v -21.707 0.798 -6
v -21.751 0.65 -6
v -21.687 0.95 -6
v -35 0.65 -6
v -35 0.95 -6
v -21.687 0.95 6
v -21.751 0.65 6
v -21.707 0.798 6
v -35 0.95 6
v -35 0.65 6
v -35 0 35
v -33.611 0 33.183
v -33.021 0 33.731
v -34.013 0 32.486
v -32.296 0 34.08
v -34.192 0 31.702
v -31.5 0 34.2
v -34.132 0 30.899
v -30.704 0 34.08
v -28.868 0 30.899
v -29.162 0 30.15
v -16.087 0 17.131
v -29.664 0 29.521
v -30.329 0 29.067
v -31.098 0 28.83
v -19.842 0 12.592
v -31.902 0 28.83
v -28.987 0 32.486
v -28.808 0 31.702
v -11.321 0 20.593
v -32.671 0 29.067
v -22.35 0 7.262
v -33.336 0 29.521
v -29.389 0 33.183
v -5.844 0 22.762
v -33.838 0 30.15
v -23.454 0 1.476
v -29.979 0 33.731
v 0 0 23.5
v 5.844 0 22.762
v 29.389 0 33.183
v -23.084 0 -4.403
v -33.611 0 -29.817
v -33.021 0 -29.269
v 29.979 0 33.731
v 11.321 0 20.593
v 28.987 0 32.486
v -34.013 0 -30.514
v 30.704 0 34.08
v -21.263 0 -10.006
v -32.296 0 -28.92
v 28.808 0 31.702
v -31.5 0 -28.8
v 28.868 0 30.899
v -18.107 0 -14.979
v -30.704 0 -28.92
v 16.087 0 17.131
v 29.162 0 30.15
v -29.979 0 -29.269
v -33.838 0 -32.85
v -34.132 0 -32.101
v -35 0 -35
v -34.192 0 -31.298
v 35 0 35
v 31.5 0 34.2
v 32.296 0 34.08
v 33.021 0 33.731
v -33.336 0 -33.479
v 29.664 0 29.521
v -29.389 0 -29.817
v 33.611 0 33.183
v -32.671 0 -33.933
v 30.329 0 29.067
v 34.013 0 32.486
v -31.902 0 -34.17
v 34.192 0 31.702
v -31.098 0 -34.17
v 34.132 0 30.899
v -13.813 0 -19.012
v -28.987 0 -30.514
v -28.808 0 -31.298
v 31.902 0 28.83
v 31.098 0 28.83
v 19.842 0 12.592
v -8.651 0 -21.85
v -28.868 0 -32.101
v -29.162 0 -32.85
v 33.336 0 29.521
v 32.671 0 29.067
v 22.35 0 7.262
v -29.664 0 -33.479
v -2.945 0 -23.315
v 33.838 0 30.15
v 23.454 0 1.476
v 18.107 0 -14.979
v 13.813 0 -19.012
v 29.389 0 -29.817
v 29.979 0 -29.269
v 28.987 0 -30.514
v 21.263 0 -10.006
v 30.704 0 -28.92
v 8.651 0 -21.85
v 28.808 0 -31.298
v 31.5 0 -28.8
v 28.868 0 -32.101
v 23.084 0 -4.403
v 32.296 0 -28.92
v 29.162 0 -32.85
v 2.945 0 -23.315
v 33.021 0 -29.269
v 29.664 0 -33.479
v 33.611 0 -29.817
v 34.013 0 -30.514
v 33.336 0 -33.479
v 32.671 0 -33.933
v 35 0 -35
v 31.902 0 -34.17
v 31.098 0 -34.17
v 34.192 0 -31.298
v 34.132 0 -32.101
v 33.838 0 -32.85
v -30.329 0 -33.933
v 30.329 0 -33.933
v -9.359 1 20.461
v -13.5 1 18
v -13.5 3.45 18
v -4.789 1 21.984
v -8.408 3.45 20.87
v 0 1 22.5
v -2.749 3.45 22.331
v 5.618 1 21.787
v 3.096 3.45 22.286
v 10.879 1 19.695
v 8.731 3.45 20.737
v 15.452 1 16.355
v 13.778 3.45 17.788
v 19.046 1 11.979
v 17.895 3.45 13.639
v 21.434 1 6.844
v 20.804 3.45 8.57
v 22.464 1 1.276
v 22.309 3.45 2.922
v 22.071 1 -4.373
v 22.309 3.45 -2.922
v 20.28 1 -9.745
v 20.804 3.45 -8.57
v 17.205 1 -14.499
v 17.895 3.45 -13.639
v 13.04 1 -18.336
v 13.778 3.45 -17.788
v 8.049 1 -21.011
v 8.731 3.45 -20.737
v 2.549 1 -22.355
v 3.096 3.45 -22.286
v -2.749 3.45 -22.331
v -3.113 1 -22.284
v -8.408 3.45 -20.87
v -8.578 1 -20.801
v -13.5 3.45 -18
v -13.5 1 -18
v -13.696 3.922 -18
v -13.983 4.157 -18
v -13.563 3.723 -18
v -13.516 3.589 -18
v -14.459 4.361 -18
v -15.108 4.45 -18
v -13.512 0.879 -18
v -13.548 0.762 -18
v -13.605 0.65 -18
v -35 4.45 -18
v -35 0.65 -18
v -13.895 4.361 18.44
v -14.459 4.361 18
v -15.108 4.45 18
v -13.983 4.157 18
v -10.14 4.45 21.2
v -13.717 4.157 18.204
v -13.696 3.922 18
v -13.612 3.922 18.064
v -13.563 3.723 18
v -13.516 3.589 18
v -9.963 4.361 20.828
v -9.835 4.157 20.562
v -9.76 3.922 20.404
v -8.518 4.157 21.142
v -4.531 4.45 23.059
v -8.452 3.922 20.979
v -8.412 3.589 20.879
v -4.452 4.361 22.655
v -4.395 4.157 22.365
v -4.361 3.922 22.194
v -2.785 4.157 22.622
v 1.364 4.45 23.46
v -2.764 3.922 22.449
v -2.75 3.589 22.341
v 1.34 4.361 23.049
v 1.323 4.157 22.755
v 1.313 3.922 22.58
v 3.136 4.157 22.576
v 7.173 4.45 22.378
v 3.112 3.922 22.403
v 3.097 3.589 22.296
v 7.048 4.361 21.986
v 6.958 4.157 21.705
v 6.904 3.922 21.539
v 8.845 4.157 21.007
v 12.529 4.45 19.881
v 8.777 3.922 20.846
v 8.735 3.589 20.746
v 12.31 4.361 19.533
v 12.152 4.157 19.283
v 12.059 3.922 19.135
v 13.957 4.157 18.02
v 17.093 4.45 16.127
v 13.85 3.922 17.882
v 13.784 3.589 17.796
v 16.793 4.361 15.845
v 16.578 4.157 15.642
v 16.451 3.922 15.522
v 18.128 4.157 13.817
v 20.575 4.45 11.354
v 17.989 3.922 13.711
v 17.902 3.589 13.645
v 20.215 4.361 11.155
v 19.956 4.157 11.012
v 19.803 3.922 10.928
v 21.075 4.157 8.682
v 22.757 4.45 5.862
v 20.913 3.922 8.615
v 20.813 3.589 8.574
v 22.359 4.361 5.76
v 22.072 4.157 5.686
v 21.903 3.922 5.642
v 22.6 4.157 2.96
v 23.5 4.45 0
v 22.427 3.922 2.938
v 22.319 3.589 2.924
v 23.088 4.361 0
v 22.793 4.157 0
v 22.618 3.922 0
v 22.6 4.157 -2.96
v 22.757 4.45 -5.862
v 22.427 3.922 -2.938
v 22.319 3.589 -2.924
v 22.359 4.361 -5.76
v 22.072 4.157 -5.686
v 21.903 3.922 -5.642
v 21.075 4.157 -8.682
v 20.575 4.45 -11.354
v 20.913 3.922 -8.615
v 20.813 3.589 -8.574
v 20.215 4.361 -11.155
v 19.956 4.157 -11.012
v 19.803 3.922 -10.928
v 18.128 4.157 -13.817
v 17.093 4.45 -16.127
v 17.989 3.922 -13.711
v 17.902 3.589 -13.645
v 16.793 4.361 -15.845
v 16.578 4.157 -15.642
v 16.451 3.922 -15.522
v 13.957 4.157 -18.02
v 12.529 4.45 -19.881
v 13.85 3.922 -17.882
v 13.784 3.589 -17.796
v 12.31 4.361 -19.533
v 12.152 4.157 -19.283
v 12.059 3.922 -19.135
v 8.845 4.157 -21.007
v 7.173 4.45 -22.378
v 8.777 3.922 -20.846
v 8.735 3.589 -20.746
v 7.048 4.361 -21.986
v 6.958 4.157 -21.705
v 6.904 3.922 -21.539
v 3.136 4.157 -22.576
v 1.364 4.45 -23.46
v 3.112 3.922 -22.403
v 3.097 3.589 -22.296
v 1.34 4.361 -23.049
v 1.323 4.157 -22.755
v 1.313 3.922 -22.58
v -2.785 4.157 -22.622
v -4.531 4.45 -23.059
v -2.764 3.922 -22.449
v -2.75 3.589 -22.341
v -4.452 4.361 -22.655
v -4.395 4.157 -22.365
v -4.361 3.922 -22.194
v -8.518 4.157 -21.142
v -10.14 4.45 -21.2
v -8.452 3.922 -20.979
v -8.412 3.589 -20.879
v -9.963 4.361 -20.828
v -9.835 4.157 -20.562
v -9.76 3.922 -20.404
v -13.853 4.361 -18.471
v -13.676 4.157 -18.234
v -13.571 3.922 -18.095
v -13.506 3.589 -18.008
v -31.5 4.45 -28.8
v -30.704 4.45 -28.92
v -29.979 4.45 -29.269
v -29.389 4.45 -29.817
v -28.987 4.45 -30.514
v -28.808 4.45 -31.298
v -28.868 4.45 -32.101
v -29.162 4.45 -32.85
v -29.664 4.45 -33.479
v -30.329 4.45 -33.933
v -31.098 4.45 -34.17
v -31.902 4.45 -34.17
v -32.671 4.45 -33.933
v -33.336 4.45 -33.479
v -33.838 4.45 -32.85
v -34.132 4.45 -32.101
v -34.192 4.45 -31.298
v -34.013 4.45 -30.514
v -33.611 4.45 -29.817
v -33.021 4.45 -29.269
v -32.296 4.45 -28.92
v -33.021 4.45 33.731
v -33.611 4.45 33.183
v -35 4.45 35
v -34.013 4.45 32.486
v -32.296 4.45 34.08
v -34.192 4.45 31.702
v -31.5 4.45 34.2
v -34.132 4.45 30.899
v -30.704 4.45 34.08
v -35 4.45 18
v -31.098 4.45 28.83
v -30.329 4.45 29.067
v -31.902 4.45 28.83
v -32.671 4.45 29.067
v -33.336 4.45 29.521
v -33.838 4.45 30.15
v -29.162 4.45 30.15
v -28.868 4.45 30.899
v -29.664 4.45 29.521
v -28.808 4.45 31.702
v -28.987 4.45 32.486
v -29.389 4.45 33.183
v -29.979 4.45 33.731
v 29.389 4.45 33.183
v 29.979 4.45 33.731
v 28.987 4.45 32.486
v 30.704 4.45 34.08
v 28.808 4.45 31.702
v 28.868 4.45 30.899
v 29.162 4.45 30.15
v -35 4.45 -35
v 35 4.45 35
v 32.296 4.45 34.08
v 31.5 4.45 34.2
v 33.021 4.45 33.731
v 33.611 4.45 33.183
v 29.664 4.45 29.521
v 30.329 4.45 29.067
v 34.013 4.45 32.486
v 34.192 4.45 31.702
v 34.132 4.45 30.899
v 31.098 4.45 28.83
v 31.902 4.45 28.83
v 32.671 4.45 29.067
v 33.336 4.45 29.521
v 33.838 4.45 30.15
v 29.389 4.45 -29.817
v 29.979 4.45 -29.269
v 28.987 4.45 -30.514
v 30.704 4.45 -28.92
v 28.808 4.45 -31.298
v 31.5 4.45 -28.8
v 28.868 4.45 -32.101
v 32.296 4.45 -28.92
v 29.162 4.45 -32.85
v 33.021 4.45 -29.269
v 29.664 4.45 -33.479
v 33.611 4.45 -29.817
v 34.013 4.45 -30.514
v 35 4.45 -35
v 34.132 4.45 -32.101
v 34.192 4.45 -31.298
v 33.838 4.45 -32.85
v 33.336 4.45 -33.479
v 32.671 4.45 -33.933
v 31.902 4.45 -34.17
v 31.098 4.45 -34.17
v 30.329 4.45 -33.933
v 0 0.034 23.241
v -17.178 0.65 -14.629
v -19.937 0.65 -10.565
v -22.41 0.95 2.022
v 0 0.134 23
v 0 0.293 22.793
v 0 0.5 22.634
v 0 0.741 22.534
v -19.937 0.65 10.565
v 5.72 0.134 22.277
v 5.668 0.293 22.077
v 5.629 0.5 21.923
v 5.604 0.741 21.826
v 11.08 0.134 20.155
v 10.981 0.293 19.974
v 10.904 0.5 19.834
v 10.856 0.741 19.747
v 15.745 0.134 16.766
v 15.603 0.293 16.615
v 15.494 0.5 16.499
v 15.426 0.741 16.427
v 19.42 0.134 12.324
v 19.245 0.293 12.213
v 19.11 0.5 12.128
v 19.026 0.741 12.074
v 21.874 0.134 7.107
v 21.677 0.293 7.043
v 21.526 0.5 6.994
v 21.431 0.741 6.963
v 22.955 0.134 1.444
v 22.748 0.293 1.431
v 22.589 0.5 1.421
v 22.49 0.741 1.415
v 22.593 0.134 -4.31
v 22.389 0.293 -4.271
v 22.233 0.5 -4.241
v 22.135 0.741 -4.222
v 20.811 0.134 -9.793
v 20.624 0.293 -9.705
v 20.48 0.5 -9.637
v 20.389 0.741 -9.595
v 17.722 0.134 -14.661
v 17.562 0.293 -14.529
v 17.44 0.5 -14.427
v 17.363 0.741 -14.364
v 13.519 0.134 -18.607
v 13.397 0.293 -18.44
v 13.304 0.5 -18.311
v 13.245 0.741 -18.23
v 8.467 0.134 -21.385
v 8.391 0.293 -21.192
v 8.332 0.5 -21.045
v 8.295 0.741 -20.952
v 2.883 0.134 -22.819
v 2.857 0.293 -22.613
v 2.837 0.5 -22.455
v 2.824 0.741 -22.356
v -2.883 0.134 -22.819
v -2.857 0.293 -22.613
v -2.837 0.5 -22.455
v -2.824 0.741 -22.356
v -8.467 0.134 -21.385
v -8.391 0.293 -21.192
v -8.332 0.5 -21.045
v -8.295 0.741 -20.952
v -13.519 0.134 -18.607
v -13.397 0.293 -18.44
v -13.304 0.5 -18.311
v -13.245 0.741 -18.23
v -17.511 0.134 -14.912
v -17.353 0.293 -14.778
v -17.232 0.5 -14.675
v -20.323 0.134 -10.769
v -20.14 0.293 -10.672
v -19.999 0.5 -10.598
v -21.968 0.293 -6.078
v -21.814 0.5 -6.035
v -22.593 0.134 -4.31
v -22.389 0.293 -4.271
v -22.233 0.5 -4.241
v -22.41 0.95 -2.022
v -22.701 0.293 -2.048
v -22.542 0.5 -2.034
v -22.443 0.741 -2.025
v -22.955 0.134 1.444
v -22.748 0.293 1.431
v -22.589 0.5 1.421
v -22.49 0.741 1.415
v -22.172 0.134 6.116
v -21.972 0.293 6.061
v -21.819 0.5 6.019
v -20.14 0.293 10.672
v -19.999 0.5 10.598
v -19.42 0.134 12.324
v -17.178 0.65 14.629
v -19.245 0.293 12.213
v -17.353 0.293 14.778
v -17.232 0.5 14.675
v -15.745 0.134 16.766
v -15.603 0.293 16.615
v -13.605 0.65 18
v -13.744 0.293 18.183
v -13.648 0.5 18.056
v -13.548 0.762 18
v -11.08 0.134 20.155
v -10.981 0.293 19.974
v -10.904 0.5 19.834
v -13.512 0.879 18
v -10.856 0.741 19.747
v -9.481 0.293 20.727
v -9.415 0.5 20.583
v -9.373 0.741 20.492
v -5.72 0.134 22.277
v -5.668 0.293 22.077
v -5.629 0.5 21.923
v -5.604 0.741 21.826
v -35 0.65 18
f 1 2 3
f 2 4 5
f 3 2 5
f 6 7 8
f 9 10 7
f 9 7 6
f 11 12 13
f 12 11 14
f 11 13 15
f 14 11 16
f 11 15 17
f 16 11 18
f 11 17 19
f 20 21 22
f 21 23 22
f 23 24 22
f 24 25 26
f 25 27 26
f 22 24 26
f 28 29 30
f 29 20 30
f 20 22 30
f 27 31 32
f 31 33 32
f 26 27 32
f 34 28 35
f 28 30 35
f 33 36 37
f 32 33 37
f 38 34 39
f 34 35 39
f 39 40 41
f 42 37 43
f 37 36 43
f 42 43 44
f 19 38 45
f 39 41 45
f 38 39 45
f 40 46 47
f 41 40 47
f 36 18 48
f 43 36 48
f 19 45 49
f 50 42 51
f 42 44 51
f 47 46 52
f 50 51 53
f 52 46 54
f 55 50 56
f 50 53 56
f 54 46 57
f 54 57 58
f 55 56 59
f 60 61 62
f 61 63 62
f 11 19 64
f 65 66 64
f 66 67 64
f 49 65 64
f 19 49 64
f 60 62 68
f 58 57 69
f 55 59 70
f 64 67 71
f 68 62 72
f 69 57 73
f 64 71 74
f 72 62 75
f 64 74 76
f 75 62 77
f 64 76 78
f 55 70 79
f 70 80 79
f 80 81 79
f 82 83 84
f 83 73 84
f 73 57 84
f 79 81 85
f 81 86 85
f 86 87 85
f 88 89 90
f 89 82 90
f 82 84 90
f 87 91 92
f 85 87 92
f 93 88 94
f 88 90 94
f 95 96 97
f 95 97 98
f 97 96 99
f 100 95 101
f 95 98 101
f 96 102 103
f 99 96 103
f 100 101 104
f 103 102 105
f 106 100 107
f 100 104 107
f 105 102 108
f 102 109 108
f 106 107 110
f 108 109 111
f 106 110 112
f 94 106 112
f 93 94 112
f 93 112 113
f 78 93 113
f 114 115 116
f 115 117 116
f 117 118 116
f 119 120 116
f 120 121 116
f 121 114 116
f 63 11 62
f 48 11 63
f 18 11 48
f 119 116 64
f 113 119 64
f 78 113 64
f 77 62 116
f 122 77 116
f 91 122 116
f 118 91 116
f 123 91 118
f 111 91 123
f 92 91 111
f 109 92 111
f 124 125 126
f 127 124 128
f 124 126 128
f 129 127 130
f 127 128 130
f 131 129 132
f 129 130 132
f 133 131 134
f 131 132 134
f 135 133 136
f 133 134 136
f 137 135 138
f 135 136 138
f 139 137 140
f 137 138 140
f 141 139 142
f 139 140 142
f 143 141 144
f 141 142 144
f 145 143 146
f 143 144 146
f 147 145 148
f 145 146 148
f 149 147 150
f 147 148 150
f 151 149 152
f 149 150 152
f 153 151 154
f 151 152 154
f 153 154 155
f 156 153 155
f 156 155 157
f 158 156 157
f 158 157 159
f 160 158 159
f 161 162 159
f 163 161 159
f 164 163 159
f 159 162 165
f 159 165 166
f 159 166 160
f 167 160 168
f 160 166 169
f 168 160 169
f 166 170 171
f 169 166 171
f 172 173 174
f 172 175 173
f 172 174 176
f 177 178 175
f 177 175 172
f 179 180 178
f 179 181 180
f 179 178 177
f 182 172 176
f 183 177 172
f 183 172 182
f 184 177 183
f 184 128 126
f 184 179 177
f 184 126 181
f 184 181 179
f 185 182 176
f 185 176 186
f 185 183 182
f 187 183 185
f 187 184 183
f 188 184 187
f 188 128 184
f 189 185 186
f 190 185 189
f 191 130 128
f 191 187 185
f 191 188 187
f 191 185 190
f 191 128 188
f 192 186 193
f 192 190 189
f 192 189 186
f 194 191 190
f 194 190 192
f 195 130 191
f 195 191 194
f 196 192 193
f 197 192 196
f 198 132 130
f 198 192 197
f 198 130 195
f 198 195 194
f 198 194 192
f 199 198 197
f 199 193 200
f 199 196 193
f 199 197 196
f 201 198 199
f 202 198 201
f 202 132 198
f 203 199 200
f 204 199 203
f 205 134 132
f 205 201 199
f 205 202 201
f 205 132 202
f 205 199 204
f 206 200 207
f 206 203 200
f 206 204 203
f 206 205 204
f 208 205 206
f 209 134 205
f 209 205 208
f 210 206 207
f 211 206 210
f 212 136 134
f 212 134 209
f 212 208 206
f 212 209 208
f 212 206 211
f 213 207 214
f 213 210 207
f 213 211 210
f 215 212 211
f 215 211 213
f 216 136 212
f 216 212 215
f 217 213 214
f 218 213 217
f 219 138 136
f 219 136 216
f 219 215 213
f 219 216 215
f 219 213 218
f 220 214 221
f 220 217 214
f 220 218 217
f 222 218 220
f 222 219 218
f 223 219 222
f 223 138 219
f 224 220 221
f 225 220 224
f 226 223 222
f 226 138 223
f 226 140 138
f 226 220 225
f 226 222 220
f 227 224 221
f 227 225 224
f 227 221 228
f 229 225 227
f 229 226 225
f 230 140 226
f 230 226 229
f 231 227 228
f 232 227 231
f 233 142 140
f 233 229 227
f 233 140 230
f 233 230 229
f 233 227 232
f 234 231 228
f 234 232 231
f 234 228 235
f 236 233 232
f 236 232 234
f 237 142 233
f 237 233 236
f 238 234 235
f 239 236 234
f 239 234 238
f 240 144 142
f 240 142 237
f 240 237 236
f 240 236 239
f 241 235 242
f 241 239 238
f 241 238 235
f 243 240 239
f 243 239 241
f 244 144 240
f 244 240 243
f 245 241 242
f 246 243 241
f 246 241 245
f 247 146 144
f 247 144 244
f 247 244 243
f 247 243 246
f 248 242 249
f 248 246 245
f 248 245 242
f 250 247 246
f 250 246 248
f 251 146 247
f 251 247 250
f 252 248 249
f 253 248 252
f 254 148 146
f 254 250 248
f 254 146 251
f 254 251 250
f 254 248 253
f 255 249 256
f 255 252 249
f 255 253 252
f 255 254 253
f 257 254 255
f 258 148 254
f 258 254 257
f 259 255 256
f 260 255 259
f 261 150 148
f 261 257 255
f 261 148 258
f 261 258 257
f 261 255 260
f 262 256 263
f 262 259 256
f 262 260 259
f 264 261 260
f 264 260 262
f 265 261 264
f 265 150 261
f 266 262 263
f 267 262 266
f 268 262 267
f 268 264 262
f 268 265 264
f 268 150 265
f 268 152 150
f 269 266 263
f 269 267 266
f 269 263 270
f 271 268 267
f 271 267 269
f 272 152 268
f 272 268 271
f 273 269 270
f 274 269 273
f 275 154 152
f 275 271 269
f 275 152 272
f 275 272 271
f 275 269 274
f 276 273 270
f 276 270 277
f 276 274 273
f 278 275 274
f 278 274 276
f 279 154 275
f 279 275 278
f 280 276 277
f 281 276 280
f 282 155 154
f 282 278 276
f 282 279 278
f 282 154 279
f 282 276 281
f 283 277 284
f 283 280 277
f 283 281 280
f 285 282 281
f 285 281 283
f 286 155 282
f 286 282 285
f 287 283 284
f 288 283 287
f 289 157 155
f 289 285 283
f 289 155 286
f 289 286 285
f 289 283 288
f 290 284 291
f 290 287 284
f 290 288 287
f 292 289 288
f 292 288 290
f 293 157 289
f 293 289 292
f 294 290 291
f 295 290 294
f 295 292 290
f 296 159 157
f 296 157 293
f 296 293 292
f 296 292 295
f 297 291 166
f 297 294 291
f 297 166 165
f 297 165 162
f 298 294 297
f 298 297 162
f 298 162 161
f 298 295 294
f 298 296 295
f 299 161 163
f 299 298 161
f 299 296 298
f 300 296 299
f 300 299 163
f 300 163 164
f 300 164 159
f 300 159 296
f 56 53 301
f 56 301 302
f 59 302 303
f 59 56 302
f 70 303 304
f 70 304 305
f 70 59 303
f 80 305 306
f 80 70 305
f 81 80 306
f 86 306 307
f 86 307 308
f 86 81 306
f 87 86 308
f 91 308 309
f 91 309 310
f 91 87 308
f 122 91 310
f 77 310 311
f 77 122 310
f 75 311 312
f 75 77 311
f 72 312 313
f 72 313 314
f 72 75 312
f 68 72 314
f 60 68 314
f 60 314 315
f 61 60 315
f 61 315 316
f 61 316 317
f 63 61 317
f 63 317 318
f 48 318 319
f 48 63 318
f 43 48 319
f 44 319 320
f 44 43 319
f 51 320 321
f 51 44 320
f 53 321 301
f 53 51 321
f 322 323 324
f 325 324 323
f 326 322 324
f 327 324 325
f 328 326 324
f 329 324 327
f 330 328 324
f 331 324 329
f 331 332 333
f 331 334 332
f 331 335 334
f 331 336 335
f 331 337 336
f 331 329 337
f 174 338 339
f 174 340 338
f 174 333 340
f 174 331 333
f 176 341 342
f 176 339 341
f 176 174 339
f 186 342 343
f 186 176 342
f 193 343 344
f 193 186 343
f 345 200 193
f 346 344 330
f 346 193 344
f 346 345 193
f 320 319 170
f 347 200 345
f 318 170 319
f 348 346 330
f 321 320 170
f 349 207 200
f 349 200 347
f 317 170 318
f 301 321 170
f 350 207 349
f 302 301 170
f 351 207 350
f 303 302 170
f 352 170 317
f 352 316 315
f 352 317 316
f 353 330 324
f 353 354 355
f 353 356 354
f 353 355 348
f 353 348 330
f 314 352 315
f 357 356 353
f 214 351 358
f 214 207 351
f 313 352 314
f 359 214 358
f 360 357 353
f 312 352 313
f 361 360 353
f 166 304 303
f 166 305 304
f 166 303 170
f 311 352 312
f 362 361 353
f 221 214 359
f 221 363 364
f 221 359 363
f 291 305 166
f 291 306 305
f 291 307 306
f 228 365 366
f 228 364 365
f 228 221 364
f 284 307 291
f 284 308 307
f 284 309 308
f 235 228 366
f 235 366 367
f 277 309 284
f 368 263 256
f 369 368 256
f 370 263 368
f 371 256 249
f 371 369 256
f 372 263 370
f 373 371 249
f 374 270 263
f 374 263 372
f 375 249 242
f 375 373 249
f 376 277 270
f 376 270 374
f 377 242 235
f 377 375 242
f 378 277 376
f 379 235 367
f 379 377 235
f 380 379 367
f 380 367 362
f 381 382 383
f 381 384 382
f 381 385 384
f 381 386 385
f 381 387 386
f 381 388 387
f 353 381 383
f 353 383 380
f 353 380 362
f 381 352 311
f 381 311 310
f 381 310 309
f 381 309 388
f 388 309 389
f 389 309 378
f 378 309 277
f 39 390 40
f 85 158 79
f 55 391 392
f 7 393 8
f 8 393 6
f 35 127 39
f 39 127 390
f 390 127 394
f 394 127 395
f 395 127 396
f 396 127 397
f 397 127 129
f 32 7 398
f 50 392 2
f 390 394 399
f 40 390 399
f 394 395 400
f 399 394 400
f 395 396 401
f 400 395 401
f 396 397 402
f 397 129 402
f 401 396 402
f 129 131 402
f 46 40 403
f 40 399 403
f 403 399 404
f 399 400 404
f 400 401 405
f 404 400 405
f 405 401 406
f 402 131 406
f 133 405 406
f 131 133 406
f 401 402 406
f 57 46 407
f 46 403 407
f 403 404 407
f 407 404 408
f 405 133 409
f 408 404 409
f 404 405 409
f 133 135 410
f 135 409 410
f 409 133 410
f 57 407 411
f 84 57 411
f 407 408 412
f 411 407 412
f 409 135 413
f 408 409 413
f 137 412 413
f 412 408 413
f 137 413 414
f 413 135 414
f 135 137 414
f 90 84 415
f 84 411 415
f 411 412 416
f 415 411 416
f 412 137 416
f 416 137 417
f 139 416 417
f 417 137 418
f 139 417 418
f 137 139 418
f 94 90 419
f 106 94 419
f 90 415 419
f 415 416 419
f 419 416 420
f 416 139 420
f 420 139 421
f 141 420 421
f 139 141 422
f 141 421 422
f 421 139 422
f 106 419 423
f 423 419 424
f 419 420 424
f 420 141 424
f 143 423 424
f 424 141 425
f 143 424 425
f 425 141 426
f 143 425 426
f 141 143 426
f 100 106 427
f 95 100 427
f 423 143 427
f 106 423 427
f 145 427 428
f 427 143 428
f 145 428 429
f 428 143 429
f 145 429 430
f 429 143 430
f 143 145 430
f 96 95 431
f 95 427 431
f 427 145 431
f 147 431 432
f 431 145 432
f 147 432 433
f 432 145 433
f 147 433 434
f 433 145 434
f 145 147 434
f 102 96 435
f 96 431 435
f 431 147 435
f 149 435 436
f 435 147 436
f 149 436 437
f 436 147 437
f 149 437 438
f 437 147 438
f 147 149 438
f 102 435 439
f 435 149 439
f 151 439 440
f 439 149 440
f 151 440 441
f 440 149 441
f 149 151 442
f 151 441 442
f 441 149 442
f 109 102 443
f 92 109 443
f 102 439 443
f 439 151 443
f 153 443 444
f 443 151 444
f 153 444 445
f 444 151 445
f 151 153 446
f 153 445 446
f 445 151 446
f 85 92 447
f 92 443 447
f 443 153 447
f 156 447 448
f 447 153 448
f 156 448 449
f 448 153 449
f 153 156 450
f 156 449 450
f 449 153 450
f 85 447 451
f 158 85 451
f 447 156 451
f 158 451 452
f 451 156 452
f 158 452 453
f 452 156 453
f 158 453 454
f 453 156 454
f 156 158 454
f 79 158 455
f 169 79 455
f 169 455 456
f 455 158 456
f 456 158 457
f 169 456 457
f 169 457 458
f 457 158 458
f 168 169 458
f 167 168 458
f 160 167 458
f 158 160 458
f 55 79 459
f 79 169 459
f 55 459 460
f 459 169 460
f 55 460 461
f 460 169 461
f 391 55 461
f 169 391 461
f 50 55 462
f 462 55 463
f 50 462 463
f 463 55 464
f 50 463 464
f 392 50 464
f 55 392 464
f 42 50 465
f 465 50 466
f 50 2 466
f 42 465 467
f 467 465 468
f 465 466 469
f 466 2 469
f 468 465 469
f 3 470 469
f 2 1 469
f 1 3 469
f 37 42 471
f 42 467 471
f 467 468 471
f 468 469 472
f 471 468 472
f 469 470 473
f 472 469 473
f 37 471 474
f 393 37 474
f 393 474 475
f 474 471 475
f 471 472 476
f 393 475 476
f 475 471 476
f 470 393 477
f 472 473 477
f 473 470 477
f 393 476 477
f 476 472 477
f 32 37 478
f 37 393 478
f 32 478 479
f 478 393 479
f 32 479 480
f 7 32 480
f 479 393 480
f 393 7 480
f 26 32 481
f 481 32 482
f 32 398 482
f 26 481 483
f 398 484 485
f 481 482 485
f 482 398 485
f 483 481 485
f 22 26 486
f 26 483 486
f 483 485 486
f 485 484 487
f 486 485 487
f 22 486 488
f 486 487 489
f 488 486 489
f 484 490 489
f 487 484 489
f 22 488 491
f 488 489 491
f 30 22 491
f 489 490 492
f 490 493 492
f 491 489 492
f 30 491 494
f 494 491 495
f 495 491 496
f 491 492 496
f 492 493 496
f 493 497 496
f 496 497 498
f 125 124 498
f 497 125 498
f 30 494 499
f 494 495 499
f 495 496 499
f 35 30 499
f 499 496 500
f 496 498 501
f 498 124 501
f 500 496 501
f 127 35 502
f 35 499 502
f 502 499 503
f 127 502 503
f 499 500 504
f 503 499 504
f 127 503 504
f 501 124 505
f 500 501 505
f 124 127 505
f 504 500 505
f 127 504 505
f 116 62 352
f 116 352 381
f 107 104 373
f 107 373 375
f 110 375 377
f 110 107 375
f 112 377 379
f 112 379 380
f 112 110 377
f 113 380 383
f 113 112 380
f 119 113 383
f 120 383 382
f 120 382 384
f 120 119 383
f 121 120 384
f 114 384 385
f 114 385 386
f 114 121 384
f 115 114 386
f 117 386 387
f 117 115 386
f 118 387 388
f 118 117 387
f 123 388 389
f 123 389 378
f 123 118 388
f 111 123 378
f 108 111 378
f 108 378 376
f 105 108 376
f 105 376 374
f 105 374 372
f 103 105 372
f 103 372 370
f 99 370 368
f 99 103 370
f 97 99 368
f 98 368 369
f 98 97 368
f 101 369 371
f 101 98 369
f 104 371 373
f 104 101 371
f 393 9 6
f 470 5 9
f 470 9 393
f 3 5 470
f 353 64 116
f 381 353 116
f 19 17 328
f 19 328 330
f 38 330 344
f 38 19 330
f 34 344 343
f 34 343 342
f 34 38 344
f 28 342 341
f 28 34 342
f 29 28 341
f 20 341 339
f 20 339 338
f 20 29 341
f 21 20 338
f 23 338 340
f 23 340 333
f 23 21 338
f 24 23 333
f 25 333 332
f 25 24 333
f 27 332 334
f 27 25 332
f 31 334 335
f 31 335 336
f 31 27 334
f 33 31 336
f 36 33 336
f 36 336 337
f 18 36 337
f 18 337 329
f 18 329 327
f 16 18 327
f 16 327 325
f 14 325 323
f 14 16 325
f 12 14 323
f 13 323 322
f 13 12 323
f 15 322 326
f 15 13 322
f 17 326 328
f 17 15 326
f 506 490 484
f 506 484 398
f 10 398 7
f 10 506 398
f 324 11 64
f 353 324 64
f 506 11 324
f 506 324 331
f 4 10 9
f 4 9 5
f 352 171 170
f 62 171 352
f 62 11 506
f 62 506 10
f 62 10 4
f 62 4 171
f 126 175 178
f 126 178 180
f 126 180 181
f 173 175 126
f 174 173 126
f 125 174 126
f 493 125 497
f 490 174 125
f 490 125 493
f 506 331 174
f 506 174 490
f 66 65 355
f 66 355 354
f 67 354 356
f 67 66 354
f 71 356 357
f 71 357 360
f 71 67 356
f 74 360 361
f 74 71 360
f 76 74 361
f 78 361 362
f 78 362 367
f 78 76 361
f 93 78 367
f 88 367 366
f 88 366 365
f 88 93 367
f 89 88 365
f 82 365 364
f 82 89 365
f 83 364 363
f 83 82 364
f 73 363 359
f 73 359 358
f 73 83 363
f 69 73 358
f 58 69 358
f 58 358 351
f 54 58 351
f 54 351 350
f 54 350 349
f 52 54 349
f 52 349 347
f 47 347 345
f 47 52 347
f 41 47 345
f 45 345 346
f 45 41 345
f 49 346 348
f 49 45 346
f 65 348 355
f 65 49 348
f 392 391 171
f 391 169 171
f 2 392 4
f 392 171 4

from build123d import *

# Parameters (mm, degrees)
SKETCH1_W           = 70
SKETCH1_H           = 70
SKETCH1_R           = 2.7
BOSS_EXTRUDE1_DEPTH = 4.45
SKETCH2_R           = 22.5
CUT_EXTRUDE1_DEPTH  = 50.697107562
FILLET1_R           = 1
SKETCH4_W           = 10
SKETCH4_H           = 12
CUT_EXTRUDE3_DEPTH  = 3.5
FILLET2_R           = 1
FILLET3_R           = 1
CUT_EXTRUDE4_DEPTH  = 27.5
CUT_EXTRUDE5_DEPTH  = 14.5


with BuildPart() as part:
    # Sketch1 → Boss-Extrude1 (new body)
    with BuildSketch(Plane(origin=(0, 0, 0), x_dir=(1, 0, 0), z_dir=(0, 1, 0))):
        Rectangle(SKETCH1_W, SKETCH1_H)
        with Locations(Location((31.5, 31.5, 0), (0, 0, 270))):
            Circle(SKETCH1_R, mode=Mode.SUBTRACT)
        with Locations(Location((-31.5, 31.5, 0), (0, 0, 270))):
            Circle(SKETCH1_R, mode=Mode.SUBTRACT)
        with Locations(Location((31.5, -31.5, 0), (0, 0, 270))):
            Circle(SKETCH1_R, mode=Mode.SUBTRACT)
        with Locations(Location((-31.5, -31.5, 0), (0, 0, 270))):
            Circle(SKETCH1_R, mode=Mode.SUBTRACT)
    extrude(amount=BOSS_EXTRUDE1_DEPTH)

    # Sketch2 → Cut-Extrude1 (cut, through all)
    with BuildSketch(Plane(origin=(0, 4.45, 0), x_dir=(1, 0, 0), z_dir=(0, 1, 0))):
        with Locations(Location((0, 0, 0), (0, 0, 270))):
            Circle(SKETCH2_R)
    extrude(amount=-CUT_EXTRUDE1_DEPTH, mode=Mode.SUBTRACT)

    # Fillet1
    fillet1_edges = [part.edges().sort_by_distance(p)[0] for p in [
        (0, 4.45, -22.5),
    ]]
    fillet(fillet1_edges, radius=FILLET1_R)

    # Sketch4 → Cut-Extrude3 (cut)
    with BuildSketch(Plane(origin=(0, 4.45, 0), x_dir=(1, 0, 0), z_dir=(0, 1, 0))):
        with Locations((-30, 0)):
            Rectangle(SKETCH4_W, SKETCH4_H)
    extrude(amount=-CUT_EXTRUDE3_DEPTH, mode=Mode.SUBTRACT)

    # Fillet2
    fillet2_edges = [part.edges().sort_by_distance(p)[0] for p in [
        (0, 0, -22.5),
    ]]
    fillet(fillet2_edges, radius=FILLET2_R)

    # Fillet3
    fillet3_edges = [part.edges().sort_by_distance(p)[0] for p in [
        (-30, 4.45, -6),
        (-30, 4.45, 6),
    ]]
    fillet(fillet3_edges, radius=FILLET3_R)

    # Sketch6 → Cut-Extrude4 (cut)
    with BuildSketch(Plane.ZY.offset(35)):
        with BuildLine():
            Line((7, 4.45), (18, 4.45))
            Line((18, 4.45), (18, 0.65))
            Line((18, 0.65), (6, 0.65))
            Line((6, 0.65), (6, 3.45))
            ThreePointArc((6, 3.45), (6.292893219, 4.157106781), (7, 4.45))
        make_face()
        with BuildLine():
            Line((-7, 4.45), (-18, 4.45))
            Line((-18, 4.45), (-18, 0.65))
            Line((-18, 0.65), (-6, 0.65))
            Line((-6, 0.65), (-6, 3.45))
            ThreePointArc((-6, 3.45), (-6.292893219, 4.157106781), (-7, 4.45))
        make_face()
    extrude(amount=-CUT_EXTRUDE4_DEPTH, mode=Mode.SUBTRACT)

    # Sketch7 → Cut-Extrude5 (cut)
    with BuildSketch(Plane.ZY.offset(25)):
        with BuildLine():
            Line((7, 4.45), (-7, 4.45))
            ThreePointArc((-7, 4.45), (-6.292893219, 4.157106781), (-6, 3.45))
            Line((-6, 3.45), (-6, 0.95))
            Line((-6, 0.95), (6, 0.95))
            Line((6, 0.95), (6, 3.45))
            ThreePointArc((6, 3.45), (6.292893219, 4.157106781), (7, 4.45))
        make_face()
    extrude(amount=-CUT_EXTRUDE5_DEPTH, mode=Mode.SUBTRACT)


with BuildPart() as cut_extrude5_kept_piece:
    # of the separate pieces the step leaves, the one the design keeps (cut_extrude5_pieces_kept)
    add(part.part.solids().sort_by_distance((-35, 4.45, 18))[0])


solid = cut_extrude5_kept_piece.part
